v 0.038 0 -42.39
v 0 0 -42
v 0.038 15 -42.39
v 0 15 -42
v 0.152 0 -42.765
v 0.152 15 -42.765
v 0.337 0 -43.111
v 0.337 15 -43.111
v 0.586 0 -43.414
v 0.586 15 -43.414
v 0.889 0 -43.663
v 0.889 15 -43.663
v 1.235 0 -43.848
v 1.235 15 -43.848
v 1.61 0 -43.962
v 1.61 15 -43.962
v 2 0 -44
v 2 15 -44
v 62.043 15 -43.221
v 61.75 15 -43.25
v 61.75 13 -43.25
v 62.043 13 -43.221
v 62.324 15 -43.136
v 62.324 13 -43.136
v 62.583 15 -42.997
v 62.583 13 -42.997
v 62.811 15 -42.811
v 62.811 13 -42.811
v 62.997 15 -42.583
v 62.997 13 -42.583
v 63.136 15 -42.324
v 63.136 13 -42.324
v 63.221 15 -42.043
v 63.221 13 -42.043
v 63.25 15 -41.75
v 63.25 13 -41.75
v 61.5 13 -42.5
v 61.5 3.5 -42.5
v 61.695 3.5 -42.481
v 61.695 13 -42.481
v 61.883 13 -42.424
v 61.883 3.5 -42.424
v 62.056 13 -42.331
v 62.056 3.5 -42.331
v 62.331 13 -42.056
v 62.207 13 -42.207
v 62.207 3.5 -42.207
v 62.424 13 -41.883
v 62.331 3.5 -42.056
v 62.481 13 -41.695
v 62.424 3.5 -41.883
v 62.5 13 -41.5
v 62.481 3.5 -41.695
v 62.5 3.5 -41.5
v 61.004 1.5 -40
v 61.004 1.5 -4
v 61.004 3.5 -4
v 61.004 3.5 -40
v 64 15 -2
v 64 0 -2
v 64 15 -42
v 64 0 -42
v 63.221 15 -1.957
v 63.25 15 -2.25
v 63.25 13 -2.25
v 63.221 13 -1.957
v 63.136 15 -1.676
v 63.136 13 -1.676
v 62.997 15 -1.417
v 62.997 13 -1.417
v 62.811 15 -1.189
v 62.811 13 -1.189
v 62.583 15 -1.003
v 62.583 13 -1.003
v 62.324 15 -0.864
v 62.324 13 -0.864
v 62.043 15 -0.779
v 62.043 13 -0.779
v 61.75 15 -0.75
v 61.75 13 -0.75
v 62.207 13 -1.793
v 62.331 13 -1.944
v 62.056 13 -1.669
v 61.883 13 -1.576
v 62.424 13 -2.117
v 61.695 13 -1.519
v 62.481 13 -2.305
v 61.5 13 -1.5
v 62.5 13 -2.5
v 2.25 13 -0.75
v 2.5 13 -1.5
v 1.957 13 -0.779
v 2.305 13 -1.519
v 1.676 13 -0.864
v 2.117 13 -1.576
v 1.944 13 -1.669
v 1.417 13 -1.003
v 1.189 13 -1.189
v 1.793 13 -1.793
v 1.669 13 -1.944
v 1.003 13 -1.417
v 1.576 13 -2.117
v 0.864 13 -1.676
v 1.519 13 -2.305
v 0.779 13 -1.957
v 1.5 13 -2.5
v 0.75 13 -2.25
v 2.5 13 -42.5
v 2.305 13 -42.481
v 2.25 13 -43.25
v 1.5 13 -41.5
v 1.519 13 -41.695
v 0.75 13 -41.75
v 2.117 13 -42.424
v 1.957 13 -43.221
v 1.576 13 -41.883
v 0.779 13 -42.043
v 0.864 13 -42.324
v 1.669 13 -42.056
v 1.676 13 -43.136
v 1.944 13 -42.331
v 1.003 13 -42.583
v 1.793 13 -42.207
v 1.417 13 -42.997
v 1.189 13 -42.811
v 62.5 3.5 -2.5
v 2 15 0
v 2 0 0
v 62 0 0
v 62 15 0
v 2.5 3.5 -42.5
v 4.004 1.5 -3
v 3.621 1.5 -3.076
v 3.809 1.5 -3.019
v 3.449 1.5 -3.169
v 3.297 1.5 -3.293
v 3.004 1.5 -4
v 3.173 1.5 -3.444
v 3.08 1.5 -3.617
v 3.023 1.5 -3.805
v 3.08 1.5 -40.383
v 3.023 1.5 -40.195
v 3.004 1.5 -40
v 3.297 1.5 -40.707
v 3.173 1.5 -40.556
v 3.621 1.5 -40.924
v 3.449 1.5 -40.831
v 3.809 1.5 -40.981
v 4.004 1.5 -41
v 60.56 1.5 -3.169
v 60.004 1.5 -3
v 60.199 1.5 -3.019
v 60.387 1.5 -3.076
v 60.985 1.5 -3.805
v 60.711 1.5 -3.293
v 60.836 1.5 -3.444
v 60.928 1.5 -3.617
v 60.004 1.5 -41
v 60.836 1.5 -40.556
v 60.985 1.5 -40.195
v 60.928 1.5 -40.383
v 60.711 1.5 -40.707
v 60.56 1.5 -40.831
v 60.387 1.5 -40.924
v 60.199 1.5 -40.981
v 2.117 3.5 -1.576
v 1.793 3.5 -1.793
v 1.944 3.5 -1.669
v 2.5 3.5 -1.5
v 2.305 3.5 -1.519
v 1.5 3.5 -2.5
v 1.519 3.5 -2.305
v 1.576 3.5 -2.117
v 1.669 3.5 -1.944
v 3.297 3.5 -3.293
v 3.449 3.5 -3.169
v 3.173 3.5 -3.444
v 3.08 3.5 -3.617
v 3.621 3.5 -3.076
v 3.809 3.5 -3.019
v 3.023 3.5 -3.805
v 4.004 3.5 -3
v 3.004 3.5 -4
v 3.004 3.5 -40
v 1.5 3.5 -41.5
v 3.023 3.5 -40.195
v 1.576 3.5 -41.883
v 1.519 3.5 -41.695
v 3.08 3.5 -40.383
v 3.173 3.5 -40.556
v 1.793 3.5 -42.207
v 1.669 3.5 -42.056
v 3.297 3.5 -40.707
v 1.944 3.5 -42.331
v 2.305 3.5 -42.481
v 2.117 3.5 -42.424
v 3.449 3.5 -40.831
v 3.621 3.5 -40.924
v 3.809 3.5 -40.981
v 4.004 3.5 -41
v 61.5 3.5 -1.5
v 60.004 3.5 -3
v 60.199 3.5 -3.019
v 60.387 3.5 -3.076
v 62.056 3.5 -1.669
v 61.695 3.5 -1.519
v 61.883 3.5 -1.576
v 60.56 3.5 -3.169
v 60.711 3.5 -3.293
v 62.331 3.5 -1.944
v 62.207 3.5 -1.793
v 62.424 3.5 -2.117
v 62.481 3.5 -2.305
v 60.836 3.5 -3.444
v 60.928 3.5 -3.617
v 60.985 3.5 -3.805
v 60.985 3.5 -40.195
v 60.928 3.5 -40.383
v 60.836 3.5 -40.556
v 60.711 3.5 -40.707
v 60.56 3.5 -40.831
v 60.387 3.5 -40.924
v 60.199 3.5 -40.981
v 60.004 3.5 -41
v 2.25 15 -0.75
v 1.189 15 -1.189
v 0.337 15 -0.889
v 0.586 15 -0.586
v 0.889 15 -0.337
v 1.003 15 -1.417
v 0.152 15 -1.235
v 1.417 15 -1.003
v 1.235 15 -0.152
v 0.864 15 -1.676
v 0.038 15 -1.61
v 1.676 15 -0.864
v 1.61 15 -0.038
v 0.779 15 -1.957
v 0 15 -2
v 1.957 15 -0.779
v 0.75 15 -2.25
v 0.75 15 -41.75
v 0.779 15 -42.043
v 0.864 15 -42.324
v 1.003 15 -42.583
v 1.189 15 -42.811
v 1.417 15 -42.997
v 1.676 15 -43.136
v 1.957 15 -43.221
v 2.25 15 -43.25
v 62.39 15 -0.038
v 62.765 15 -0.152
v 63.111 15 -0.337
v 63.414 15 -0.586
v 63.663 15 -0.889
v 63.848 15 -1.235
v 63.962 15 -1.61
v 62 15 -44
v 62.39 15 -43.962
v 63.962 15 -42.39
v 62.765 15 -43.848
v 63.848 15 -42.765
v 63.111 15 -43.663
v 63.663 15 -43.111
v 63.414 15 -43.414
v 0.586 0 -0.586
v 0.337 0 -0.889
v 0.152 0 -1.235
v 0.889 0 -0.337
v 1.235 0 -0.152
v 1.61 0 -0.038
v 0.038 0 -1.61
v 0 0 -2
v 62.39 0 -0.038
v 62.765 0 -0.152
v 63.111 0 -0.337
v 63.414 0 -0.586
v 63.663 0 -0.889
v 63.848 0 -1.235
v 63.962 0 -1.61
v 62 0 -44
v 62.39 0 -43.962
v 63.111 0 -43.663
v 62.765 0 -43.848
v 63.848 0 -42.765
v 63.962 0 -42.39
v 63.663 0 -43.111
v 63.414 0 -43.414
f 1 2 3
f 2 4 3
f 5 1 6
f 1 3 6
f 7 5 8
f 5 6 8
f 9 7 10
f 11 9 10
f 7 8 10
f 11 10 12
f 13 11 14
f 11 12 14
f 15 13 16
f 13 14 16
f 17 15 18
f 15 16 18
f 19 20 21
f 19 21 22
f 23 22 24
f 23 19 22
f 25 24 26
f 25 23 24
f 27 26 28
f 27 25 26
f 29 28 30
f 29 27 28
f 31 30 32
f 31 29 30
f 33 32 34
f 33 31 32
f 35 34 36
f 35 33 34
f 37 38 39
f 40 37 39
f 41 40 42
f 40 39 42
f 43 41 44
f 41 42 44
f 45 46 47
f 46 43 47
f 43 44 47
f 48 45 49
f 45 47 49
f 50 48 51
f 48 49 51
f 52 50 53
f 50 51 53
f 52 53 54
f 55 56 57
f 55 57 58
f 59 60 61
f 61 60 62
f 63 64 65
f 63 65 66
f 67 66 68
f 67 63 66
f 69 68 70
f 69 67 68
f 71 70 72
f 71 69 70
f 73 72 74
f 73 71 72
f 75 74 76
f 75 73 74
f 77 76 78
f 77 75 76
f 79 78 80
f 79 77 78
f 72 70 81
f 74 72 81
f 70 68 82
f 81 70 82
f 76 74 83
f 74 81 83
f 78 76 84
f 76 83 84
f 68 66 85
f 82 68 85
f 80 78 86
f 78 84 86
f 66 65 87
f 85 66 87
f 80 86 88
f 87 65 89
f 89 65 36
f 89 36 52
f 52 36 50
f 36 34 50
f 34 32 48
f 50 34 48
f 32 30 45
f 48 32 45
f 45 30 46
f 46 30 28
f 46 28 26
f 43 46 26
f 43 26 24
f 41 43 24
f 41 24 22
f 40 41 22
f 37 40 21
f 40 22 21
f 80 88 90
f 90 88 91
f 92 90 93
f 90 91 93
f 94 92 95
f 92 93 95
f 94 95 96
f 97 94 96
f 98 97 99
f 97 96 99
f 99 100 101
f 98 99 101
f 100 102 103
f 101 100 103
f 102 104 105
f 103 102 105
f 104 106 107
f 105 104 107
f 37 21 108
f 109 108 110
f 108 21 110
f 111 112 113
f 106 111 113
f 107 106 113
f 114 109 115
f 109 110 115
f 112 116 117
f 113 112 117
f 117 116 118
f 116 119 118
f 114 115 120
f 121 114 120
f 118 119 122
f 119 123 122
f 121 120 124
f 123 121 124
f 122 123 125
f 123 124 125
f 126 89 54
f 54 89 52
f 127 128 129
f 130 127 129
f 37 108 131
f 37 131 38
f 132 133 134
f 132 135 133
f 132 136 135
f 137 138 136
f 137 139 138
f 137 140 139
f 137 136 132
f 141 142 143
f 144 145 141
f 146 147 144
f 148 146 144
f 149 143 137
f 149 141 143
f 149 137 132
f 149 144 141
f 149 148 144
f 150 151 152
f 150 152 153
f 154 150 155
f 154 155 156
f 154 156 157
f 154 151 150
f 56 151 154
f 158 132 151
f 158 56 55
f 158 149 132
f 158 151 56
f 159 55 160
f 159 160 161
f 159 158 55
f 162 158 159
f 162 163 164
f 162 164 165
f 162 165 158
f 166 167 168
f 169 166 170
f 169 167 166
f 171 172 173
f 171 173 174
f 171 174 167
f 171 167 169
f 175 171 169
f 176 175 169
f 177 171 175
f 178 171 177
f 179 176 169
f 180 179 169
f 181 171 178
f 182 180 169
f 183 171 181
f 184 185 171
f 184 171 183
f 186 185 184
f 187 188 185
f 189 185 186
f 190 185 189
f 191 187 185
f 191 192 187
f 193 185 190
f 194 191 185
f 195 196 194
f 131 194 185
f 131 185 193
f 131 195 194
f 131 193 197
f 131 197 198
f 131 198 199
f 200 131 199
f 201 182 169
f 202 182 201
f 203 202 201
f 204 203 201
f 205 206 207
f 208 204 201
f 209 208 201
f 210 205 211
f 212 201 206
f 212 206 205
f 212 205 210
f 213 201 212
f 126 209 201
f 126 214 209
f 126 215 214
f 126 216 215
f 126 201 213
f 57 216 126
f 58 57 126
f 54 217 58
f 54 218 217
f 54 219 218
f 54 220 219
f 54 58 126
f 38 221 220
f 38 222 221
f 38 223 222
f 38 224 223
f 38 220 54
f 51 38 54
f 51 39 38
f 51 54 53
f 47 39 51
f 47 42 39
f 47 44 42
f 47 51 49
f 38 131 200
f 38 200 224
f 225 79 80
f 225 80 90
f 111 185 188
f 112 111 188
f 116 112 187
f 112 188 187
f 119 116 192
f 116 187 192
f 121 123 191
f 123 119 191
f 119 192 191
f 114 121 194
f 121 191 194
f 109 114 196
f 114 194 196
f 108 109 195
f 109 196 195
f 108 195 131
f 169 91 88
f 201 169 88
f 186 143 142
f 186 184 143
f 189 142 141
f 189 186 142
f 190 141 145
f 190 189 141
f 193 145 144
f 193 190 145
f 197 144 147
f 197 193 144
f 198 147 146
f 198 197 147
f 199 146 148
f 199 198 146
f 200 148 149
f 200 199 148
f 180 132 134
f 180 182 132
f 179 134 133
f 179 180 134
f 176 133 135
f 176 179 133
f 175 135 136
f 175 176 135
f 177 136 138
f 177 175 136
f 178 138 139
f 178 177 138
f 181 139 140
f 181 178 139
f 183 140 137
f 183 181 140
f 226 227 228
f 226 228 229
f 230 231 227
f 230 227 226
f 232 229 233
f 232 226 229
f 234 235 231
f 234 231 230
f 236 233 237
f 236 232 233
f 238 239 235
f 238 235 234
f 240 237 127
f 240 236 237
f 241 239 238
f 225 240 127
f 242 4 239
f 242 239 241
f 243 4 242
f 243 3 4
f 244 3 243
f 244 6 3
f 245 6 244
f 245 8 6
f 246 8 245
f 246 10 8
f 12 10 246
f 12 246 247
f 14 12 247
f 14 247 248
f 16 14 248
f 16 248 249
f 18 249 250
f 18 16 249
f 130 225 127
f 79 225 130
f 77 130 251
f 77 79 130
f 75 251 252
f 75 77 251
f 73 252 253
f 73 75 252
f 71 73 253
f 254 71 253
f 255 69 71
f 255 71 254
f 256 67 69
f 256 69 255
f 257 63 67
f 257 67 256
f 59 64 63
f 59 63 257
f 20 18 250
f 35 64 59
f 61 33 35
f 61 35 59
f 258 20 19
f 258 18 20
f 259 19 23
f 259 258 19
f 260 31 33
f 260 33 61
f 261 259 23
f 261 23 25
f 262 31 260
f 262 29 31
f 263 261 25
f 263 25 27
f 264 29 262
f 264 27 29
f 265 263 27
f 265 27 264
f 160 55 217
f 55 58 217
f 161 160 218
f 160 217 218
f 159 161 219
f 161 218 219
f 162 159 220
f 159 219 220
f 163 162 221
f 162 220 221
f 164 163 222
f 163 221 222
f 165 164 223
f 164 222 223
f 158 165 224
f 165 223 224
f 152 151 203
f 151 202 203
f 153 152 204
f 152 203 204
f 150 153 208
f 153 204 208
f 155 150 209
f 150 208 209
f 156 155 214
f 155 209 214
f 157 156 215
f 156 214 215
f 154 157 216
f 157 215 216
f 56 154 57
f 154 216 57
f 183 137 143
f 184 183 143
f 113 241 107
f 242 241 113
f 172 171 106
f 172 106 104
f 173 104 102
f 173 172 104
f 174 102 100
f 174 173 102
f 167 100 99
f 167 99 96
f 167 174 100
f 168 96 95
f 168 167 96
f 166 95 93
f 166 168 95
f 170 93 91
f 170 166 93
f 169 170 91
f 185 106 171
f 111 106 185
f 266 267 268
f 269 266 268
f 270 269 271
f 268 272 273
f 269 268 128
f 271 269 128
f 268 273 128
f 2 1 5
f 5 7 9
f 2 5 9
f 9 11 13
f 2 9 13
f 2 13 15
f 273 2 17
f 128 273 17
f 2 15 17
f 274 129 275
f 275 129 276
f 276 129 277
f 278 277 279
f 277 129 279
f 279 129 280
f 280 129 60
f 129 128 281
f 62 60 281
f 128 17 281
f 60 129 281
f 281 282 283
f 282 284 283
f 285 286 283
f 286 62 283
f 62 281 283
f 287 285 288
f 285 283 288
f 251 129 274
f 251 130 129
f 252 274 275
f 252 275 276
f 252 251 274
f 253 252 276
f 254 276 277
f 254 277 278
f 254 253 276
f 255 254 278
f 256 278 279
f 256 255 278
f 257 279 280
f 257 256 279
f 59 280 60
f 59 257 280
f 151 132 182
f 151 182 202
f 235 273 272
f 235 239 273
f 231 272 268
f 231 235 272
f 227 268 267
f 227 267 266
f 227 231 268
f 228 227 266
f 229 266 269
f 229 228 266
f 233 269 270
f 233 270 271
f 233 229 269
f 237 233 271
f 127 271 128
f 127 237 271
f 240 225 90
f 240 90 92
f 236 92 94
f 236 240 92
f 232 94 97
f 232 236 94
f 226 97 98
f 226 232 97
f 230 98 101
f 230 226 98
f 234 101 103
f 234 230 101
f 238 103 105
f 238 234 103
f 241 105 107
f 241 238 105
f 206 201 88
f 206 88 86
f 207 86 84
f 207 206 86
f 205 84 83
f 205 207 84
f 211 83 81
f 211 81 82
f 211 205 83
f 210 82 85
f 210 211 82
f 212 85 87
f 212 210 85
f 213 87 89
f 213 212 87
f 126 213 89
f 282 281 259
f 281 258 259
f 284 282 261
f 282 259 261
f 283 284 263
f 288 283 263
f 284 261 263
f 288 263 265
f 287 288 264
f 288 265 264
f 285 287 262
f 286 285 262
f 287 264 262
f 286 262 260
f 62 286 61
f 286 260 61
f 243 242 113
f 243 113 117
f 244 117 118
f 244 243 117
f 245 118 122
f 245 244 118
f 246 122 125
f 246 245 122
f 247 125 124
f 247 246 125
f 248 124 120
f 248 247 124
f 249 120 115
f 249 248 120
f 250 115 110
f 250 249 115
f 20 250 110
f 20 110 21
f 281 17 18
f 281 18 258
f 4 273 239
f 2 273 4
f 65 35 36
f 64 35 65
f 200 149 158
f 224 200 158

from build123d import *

# Parameters (mm, degrees)
SKETCH1_W           = 64
SKETCH1_H           = 44
BOSS_EXTRUDE1_DEPTH = 15
SKETCH2_W           = 61
SKETCH2_H           = 41
CUT_EXTRUDE1_DEPTH  = 13.5
SKETCH3_W           = 61
SKETCH3_H           = 41
SKETCH3_W_2         = 58
SKETCH3_H_2         = 38
BOSS_EXTRUDE2_DEPTH = 2
FILLET1_R           = 1
FILLET2_R           = 2
CUT_EXTRUDE2_DEPTH  = 2


with BuildPart() as part:
    # Sketch1 → Boss-Extrude1 (new body)
    with BuildSketch(Plane(origin=(0, 0, 0), x_dir=(1, 0, 0), z_dir=(0, 1, 0))):
        with Locations((32, 22)):
            Rectangle(SKETCH1_W, SKETCH1_H)
    extrude(amount=BOSS_EXTRUDE1_DEPTH)

    # Sketch2 → Cut-Extrude1 (cut)
    with BuildSketch(Plane(origin=(0, 15, 0), x_dir=(1, 0, 0), z_dir=(0, 1, 0))):
        with Locations((32, 22)):
            Rectangle(SKETCH2_W, SKETCH2_H)
    extrude(amount=-CUT_EXTRUDE1_DEPTH, mode=Mode.SUBTRACT)

    # Sketch3 → Boss-Extrude2 (add)
    with BuildSketch(Plane(origin=(0, 1.5, 0), x_dir=(1, 0, 0), z_dir=(0, 1, 0))):
        with Locations((32, 22)):
            Rectangle(SKETCH3_W, SKETCH3_H)
        with Locations((32.004099557, 22)):
            Rectangle(SKETCH3_W_2, SKETCH3_H_2, mode=Mode.SUBTRACT)
    extrude(amount=BOSS_EXTRUDE2_DEPTH)

    # Fillet1
    fillet1_edges = [part.edges().sort_by_distance(p)[0] for p in [
        (1.5, 9.25, -42.5),
        (62.5, 9.25, -42.5),
        (1.5, 9.25, -1.5),
        (62.5, 9.25, -1.5),
        (61.004099557, 2.5, -41),
        (3.004099557, 2.5, -41),
        (3.004099557, 2.5, -3),
        (61.004099557, 2.5, -3),
    ]]
    fillet(fillet1_edges, radius=FILLET1_R)

    # Fillet2
    fillet2_edges = [part.edges().sort_by_distance(p)[0] for p in [
        (0, 7.5, -44),
        (64, 7.5, -44),
        (64, 7.5, 0),
        (0, 7.5, 0),
    ]]
    fillet(fillet2_edges, radius=FILLET2_R)

    # Sketch4 → Cut-Extrude2 (cut)
    with BuildSketch(Plane(origin=(0, 15, 0), x_dir=(1, 0, 0), z_dir=(0, 1, 0))):
        with BuildLine():
            Line((2.25, 43.25), (61.75, 43.25))
            ThreePointArc((61.75, 43.25), (62.810660172, 42.810660172), (63.25, 41.75))
            Line((63.25, 41.75), (63.25, 2.25))
            ThreePointArc((63.25, 2.25), (62.810660172, 1.189339828), (61.75, 0.75))
            Line((61.75, 0.75), (2.25, 0.75))
            ThreePointArc((2.25, 0.75), (1.189339828, 1.189339828), (0.75, 2.25))
            Line((0.75, 2.25), (0.75, 41.75))
            ThreePointArc((0.75, 41.75), (1.189339828, 42.810660172), (2.25, 43.25))
        make_face()
        with BuildLine():
            Line((61.5, 42.5), (2.5, 42.5))
            ThreePointArc((2.5, 42.5), (1.792893219, 42.207106781), (1.5, 41.5))
            Line((1.5, 41.5), (1.5, 2.5))
            ThreePointArc((1.5, 2.5), (1.792893219, 1.792893219), (2.5, 1.5))
            Line((2.5, 1.5), (61.5, 1.5))
            ThreePointArc((61.5, 1.5), (62.207106781, 1.792893219), (62.5, 2.5))
            Line((62.5, 2.5), (62.5, 41.5))
            ThreePointArc((62.5, 41.5), (62.207106781, 42.207106781), (61.5, 42.5))
        make_face(mode=Mode.SUBTRACT)
    extrude(amount=-CUT_EXTRUDE2_DEPTH, mode=Mode.SUBTRACT)


solid = part.part
